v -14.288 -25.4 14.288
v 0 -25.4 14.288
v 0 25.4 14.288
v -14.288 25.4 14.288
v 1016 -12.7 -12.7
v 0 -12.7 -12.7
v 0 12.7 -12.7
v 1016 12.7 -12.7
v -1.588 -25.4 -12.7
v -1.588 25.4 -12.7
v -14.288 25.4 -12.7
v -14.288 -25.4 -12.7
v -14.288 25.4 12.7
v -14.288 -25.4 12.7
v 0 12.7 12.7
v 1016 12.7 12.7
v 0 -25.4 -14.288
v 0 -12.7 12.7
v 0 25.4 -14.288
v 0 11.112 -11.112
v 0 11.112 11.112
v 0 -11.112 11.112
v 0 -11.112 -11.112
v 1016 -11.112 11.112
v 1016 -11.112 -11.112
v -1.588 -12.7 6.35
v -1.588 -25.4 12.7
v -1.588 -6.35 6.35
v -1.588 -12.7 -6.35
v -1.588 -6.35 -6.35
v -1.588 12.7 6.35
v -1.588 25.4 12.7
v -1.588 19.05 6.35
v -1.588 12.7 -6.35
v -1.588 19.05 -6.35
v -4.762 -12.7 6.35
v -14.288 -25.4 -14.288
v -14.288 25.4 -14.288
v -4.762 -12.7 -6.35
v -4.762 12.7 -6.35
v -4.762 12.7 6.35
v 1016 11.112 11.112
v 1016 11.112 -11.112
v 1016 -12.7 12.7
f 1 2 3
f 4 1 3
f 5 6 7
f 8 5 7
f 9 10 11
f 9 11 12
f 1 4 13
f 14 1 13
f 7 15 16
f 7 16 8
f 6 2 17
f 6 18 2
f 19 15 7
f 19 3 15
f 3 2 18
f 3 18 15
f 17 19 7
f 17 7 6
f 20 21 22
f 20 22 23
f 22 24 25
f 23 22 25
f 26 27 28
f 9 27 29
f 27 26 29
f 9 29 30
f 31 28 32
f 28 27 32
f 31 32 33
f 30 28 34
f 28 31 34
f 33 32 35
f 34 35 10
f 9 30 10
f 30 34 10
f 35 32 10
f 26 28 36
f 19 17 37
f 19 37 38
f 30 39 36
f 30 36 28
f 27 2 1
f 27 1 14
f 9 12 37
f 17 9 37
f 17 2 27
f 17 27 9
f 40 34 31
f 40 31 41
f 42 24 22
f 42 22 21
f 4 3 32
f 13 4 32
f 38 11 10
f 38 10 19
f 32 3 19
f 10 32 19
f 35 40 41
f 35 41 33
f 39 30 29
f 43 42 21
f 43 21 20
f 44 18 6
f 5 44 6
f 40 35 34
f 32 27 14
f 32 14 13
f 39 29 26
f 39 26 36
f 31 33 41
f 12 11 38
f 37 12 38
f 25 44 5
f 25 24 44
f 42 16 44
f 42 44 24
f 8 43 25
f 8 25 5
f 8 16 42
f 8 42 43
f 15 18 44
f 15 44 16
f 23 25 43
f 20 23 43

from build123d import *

# Parameters (mm, degrees)
SKETCH1_W           = 28.575
SKETCH1_H           = 50.8
BOSS_EXTRUDE1_DEPTH = 1.5875
BOSS_EXTRUDE2_DEPTH = 14.2875
SKETCH1_4_W         = 25.4
SKETCH1_4_H         = 25.4
SKETCH1_4_W_2       = 22.225
SKETCH1_4_H_2       = 22.225
BOSS_EXTRUDE3_DEPTH = 1016
BOSS_EXTRUDE4_DEPTH = 12.7
LPATTERN1_COUNT     = 2
LPATTERN1_PITCH     = 25.4


with BuildPart() as part:
    # Sketch1 → Boss-Extrude1 (new body)
    with BuildSketch(Plane(origin=(0, 0, 0), x_dir=(0, 0, -1), z_dir=(1, 0, 0))):
        Rectangle(SKETCH1_W, SKETCH1_H)
    extrude(amount=-BOSS_EXTRUDE1_DEPTH)

    # Sketch1<3> → Boss-Extrude2 (add)
    with BuildSketch(Plane(origin=(0, 0, 0), x_dir=(0, 0, -1), z_dir=(1, 0, 0))):
        Polygon((-12.7, 12.7), (-12.7, 25.4), (-14.2875, 25.4), (-14.2875, -25.4), (-12.7, -25.4), (-12.7, -12.7), align=None)
        Polygon((14.2875, 25.4), (12.7, 25.4), (12.7, 12.7), (12.7, -12.7), (12.7, -25.4), (14.2875, -25.4), align=None)
    extrude(amount=-BOSS_EXTRUDE2_DEPTH)

    # Sketch1<4> → Boss-Extrude3 (add)
    with BuildSketch(Plane(origin=(0, 0, 0), x_dir=(0, 0, -1), z_dir=(1, 0, 0))):
        Rectangle(SKETCH1_4_W, SKETCH1_4_H)
        Rectangle(SKETCH1_4_W_2, SKETCH1_4_H_2, mode=Mode.SUBTRACT)
    extrude(amount=BOSS_EXTRUDE3_DEPTH)

    # 3DSketch1 → Boss-Extrude4 (add)
    with BuildSketch(Plane(origin=(-1.5875, 12.7, -6.35), x_dir=(0, 1, 0), z_dir=(0, 0, 1))):
        Polygon((0, 0), (0, 3.175), (6.35, 0), align=None)
    boss_extrude4 = extrude(amount=BOSS_EXTRUDE4_DEPTH)

    # LPattern1: Boss-Extrude4 ×2
    with Locations(*[(0, -i * LPATTERN1_PITCH, 0) for i in range(1, LPATTERN1_COUNT)]):
        add(boss_extrude4)


solid = part.part
